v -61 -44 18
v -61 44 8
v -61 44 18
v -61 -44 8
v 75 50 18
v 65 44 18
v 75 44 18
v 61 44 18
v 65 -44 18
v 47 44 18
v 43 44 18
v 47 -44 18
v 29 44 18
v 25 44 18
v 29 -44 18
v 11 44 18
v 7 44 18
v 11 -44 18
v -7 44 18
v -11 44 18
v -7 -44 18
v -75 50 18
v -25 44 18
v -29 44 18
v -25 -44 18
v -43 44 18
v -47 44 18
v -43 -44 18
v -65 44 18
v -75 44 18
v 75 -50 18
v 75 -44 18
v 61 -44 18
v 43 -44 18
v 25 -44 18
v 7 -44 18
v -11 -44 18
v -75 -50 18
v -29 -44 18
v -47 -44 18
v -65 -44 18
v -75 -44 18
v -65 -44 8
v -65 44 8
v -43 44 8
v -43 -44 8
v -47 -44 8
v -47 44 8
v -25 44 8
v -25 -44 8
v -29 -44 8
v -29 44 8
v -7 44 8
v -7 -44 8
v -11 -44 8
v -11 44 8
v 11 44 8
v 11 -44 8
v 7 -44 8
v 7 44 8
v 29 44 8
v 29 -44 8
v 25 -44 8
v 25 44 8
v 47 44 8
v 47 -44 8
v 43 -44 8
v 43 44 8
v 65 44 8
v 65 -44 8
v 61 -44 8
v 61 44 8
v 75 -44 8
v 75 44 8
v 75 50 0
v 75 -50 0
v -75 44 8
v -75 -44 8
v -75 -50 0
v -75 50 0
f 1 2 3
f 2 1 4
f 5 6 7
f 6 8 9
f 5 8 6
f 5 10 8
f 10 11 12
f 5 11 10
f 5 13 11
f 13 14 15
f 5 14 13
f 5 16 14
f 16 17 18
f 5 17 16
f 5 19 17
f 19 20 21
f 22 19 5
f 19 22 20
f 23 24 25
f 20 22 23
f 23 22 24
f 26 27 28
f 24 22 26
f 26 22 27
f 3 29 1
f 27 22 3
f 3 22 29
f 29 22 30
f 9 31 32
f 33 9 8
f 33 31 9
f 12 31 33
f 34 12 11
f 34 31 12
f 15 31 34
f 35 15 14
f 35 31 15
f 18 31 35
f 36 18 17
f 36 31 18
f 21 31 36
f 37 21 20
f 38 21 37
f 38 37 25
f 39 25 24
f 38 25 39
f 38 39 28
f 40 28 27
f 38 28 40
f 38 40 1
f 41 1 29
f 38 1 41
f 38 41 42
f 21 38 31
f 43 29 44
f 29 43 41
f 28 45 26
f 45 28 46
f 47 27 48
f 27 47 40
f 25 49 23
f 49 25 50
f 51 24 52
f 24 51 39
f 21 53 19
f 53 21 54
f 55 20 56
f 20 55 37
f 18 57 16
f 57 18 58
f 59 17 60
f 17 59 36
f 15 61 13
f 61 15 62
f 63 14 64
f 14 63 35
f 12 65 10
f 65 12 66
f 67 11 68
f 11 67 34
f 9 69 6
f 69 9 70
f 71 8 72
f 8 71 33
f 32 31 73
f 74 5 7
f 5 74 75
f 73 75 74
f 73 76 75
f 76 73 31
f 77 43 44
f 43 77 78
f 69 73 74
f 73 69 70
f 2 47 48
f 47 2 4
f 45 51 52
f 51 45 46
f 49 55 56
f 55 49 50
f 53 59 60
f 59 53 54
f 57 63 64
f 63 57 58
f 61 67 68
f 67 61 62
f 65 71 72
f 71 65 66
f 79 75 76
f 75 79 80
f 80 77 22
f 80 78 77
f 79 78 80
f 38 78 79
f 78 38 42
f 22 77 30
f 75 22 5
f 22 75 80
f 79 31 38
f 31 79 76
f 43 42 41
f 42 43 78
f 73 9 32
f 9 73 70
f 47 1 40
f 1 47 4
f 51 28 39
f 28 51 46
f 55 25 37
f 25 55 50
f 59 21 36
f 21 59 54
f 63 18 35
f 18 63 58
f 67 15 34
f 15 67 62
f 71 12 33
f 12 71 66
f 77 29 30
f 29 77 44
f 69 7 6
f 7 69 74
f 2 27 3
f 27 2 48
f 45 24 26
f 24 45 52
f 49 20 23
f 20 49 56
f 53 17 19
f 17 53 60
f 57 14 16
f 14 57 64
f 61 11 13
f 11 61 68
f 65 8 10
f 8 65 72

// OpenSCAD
$fn = 32;

// ----------------------------------------------------------------------
// Rib frame 150 x 100 x 18
// 8 ribs at 18 mm pitch
// ----------------------------------------------------------------------

// --- parameters (mm) ---
frame = [150, 100, 8];  // base plate size (x, y, z)
rail_w = 6;             // side rail width
ribs = 8;               // number of ribs
rib_t = 4;              // rib thickness
rib_h = 10;             // rib height above the base plate
pitch = 18;             // pitch between rib centres

// --- derived feature positions (mm) ---
span = (ribs - 1) * pitch;          // = 126   distance between the outer ribs
origin_x = -span / 2;               // = -63   X of the first rib
rib_len = frame[1] - 2 * rail_w + 2;  // = 90   rib length, 1 mm into each rail
feature_centers = [
  [origin_x + 0 * pitch, 0],
  [origin_x + 1 * pitch, 0],
  [origin_x + 2 * pitch, 0],
  [origin_x + 3 * pitch, 0],
  [origin_x + 4 * pitch, 0],
  [origin_x + 5 * pitch, 0],
  [origin_x + 6 * pitch, 0],
  [origin_x + 7 * pitch, 0]
];   // rib centre line, drives the rib loop

// base plate, two side rails, then the ribs read straight off feature_centers
union() {
  translate([-frame[0] / 2, -frame[1] / 2, 0]) cube(frame);
  translate([-frame[0] / 2, -frame[1] / 2, 0]) cube([frame[0], rail_w, frame[2] + rib_h]);
  translate([-frame[0] / 2, frame[1] / 2 - rail_w, 0]) cube([frame[0], rail_w, frame[2] + rib_h]);
  for (centre = feature_centers)
    translate([centre[0] - rib_t / 2, centre[1] - rib_len / 2, frame[2] - 1])
      cube([rib_t, rib_len, rib_h + 1]);
}
